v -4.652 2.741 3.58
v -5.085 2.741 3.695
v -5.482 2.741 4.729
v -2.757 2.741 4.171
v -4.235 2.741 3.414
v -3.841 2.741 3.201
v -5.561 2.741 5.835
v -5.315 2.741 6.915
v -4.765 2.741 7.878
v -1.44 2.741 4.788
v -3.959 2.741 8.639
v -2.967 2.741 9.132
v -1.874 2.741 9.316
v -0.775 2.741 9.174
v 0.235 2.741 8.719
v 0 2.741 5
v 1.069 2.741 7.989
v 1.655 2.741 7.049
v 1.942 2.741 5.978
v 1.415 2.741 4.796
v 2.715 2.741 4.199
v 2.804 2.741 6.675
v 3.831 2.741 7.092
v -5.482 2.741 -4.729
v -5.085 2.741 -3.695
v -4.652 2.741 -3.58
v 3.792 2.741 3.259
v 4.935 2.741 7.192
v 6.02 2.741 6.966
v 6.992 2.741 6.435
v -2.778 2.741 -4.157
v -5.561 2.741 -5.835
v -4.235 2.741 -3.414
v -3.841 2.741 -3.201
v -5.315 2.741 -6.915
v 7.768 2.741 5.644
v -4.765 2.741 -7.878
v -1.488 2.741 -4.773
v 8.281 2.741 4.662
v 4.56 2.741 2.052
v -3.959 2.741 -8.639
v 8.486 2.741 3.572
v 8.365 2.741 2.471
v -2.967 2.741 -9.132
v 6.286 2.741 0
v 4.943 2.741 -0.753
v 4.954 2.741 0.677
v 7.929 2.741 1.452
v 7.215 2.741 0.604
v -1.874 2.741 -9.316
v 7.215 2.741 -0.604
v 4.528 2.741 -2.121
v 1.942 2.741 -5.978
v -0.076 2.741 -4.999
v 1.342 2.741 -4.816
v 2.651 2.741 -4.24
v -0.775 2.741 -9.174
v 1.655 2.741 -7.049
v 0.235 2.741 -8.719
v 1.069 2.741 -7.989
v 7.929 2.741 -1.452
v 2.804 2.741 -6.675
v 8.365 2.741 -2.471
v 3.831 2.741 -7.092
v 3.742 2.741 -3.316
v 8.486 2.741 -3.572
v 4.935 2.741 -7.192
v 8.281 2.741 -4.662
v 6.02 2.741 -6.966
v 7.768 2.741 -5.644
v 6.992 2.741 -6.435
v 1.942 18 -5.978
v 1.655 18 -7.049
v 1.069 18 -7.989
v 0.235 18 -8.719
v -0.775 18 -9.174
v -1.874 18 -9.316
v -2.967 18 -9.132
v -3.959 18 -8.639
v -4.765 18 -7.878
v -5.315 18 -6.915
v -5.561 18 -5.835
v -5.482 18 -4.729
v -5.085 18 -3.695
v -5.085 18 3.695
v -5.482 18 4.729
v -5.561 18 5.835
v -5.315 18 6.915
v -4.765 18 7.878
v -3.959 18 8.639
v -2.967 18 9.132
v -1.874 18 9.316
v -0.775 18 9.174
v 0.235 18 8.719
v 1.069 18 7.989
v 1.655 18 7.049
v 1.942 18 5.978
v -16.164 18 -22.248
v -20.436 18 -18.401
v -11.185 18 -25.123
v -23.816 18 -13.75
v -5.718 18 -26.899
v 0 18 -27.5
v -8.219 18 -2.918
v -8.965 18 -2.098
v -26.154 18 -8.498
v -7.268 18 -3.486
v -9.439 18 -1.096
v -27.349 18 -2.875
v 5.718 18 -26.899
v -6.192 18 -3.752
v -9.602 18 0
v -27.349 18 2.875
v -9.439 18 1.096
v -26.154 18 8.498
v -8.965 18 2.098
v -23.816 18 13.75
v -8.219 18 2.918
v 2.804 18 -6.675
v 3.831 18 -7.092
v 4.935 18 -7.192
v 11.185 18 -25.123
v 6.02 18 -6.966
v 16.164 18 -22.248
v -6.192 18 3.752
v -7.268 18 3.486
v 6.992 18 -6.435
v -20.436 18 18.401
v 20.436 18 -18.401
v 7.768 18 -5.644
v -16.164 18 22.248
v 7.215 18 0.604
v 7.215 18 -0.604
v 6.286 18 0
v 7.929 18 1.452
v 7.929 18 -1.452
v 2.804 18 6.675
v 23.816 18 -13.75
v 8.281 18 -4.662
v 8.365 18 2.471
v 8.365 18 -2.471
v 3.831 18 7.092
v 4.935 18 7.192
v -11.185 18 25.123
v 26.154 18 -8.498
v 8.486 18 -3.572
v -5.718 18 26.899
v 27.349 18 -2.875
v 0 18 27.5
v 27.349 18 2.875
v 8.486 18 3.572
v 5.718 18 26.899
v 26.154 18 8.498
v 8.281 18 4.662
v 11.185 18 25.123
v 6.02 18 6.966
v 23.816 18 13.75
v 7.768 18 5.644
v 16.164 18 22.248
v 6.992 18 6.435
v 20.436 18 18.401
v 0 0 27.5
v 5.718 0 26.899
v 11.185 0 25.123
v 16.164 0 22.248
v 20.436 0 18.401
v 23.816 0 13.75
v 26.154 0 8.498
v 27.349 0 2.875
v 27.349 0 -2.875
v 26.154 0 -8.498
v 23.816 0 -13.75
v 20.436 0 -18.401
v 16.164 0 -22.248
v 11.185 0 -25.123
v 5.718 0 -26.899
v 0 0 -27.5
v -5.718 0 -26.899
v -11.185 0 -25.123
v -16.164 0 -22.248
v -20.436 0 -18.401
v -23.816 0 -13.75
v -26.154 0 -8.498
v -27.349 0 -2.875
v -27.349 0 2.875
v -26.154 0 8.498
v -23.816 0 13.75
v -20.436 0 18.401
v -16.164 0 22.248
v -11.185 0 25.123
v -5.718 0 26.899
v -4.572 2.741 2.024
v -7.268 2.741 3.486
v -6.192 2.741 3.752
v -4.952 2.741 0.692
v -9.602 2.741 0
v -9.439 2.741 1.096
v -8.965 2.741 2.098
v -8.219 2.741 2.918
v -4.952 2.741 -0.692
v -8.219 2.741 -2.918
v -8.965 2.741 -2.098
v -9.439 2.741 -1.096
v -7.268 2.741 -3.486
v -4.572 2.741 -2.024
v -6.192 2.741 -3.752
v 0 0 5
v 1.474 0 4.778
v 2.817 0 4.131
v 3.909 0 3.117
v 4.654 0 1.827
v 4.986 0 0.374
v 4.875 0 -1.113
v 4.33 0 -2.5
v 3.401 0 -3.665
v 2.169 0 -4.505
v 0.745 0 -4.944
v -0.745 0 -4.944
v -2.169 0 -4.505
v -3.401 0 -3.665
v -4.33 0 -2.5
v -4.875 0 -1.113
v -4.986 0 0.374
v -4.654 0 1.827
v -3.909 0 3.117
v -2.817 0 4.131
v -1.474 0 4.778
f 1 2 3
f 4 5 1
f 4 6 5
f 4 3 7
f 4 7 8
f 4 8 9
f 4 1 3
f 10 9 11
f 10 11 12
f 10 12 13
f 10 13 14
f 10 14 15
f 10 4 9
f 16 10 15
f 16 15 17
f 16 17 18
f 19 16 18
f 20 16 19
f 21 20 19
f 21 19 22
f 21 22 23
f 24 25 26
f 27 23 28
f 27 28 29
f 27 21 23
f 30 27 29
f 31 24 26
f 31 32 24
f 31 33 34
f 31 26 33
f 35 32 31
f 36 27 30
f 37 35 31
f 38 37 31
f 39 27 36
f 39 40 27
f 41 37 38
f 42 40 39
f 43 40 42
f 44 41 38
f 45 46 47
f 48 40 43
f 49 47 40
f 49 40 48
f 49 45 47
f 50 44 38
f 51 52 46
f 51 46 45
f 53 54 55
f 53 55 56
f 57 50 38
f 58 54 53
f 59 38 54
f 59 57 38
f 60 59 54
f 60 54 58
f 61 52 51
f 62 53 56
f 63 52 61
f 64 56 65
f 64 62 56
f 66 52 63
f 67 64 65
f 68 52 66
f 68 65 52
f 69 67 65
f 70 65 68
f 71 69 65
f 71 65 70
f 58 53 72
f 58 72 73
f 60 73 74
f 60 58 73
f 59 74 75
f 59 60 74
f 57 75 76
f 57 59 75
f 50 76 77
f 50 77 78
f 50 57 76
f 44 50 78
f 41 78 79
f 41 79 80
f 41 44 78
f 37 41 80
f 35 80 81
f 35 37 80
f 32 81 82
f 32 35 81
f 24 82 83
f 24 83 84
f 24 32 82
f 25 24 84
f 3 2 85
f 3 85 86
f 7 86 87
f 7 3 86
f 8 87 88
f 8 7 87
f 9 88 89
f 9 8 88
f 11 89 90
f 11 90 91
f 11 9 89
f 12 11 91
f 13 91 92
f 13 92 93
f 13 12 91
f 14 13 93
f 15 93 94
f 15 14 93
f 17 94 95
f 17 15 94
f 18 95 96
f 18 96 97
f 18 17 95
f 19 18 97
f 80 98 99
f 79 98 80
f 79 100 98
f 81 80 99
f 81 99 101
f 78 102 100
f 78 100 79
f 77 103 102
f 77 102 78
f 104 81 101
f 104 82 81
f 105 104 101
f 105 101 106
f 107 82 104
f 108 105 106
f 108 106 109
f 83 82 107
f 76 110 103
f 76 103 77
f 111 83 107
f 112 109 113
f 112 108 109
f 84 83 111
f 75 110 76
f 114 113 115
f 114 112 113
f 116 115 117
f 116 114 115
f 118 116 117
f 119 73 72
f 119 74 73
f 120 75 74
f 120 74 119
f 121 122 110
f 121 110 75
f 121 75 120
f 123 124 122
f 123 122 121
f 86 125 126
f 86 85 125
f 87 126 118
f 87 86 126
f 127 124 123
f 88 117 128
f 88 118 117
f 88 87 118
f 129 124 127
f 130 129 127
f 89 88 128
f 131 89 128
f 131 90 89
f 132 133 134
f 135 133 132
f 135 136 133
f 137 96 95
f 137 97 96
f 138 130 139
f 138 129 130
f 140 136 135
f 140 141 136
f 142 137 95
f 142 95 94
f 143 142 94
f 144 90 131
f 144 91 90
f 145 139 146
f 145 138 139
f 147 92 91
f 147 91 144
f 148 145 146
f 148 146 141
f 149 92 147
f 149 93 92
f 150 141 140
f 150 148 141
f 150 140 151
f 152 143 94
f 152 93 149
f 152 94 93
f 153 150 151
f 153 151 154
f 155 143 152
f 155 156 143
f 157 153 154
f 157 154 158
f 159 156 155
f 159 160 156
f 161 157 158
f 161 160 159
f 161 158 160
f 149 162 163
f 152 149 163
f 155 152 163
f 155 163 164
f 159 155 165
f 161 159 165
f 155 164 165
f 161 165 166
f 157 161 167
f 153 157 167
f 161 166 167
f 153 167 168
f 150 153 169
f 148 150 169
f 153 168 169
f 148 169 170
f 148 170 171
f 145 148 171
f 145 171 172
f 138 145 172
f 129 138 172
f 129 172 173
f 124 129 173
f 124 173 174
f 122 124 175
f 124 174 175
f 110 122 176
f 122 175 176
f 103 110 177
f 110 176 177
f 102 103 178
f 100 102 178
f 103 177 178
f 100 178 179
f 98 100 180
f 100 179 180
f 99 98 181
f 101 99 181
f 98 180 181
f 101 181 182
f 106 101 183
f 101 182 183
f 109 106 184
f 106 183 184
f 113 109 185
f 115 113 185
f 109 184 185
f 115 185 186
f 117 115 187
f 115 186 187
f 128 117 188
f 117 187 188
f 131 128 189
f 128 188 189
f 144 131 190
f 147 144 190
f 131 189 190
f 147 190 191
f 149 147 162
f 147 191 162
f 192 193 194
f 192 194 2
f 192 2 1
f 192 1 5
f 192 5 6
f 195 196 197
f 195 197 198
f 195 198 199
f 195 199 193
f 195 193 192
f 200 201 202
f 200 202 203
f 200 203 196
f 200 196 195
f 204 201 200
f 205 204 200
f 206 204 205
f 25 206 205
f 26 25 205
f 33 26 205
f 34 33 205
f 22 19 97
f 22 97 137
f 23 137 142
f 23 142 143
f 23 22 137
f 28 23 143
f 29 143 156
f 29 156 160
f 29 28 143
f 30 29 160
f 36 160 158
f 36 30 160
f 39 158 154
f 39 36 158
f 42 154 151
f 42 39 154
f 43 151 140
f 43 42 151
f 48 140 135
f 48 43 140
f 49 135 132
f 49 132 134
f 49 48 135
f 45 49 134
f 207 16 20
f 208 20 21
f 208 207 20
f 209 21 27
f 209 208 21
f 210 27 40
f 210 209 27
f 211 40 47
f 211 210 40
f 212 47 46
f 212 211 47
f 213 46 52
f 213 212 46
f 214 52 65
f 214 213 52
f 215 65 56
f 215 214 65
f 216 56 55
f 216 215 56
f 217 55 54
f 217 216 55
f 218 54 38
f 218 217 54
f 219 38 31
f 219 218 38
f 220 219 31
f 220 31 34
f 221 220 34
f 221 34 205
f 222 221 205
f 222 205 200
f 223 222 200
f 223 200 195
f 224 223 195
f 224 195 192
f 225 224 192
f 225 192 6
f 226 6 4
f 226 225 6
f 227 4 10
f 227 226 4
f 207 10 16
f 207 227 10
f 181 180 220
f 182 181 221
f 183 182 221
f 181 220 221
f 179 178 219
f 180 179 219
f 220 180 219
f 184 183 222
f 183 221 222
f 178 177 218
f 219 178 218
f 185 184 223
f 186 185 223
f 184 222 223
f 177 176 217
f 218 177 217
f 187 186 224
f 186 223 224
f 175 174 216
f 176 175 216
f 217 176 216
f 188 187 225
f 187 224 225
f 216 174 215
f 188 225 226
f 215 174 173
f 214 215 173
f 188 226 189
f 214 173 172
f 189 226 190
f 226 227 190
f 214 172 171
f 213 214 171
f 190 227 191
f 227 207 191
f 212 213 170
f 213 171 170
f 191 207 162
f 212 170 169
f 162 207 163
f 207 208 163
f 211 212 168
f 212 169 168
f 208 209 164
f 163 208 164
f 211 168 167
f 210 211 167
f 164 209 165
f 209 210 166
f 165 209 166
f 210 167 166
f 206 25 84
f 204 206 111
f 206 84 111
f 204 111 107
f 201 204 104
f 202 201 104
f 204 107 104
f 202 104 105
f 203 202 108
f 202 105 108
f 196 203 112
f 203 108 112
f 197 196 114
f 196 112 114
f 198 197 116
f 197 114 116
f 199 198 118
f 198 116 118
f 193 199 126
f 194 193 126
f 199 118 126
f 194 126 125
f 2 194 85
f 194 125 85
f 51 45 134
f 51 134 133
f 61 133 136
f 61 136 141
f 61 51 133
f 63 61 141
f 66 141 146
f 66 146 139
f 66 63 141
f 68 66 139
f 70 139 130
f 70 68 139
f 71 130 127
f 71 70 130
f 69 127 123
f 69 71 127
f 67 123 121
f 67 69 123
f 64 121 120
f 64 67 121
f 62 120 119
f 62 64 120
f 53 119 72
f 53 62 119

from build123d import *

# Parameters (mm, degrees)
SKETCH1_R           = 27.5
BOSS_EXTRUDE1_DEPTH = 18
SKETCH2_R           = 5
CUT_EXTRUDE1_DEPTH  = 43.854404674
SKETCH3_R           = 3.769575295
CUT_EXTRUDE2_DEPTH  = 15.258814729
CIRPATTERN1_COUNT   = 5


with BuildPart() as part:
    # Sketch1 → Boss-Extrude1 (new body)
    with BuildSketch(Plane(origin=(0, 0, 0), x_dir=(1, 0, 0), z_dir=(0, 1, 0))):
        Circle(SKETCH1_R)
    extrude(amount=BOSS_EXTRUDE1_DEPTH)

    # Sketch2 → Cut-Extrude1 (cut, through all)
    with BuildSketch(Plane(origin=(0, 0, 0), x_dir=(1, 0, 0), z_dir=(0, 1, 0))):
        Circle(SKETCH2_R)
    extrude(amount=CUT_EXTRUDE1_DEPTH, mode=Mode.SUBTRACT)

    # Sketch3 → Cut-Extrude2 (cut)
    with BuildSketch(Plane(origin=(0, 18, 0), x_dir=(1, 0, 0), z_dir=(0, 1, 0))):
        with Locations((-5.832726886, 0)):
            Circle(SKETCH3_R)
    cut_extrude2 = extrude(amount=-CUT_EXTRUDE2_DEPTH, mode=Mode.SUBTRACT)

    # CirPattern1: Cut-Extrude2 ×5 about axis
    cirpattern1_axis = Axis((0, 0, 0), (0, 1, 0))
    for i in range(1, CIRPATTERN1_COUNT):
        add(cut_extrude2.rotate(cirpattern1_axis, i * 360 / CIRPATTERN1_COUNT), mode=Mode.SUBTRACT)


solid = part.part
